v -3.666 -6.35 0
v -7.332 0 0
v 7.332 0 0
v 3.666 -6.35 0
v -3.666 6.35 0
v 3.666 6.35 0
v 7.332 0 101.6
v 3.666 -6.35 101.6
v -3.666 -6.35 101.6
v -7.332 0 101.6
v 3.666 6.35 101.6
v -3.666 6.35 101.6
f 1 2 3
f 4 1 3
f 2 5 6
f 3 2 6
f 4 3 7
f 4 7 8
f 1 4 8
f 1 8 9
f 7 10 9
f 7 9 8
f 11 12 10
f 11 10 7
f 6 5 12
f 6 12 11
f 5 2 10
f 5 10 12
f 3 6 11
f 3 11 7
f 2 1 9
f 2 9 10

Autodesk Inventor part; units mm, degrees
ref_plane "YZ Plane" through (0, 0, 0) normal (1, 0, 0) x (0, 1, 0)
ref_plane "XZ Plane" through (0, 0, 0) normal (0, 1, 0) x (-1, 0, 0)
ref_plane "XY Plane" through (0, 0, 0) normal (0, 0, 1) x (1, 0, 0)
sketch "Sketch1" plane through (0, 0, 0) normal (0, 0, 1) x (1, 0, 0)
  line L0 (3.6662, 6.35) -> (7.3323, 0)
  line L1 (7.3323, 0) -> (3.6662, -6.35)
  line L2 (3.6662, -6.35) -> (-3.6662, -6.35)
  line L3 (-3.6662, -6.35) -> (-7.3323, 0)
  line L4 (-7.3323, 0) -> (-3.6662, 6.35)
  line L5 (-3.6662, 6.35) -> (3.6662, 6.35)
  line L6 (0, 0) -> (0.4498, 0)
  dimension "d0" = 12.7
extrude "Extrusion1" add sketch "Sketch1" along normal blind 101.6
properties part number "Kermit HexShaft"
